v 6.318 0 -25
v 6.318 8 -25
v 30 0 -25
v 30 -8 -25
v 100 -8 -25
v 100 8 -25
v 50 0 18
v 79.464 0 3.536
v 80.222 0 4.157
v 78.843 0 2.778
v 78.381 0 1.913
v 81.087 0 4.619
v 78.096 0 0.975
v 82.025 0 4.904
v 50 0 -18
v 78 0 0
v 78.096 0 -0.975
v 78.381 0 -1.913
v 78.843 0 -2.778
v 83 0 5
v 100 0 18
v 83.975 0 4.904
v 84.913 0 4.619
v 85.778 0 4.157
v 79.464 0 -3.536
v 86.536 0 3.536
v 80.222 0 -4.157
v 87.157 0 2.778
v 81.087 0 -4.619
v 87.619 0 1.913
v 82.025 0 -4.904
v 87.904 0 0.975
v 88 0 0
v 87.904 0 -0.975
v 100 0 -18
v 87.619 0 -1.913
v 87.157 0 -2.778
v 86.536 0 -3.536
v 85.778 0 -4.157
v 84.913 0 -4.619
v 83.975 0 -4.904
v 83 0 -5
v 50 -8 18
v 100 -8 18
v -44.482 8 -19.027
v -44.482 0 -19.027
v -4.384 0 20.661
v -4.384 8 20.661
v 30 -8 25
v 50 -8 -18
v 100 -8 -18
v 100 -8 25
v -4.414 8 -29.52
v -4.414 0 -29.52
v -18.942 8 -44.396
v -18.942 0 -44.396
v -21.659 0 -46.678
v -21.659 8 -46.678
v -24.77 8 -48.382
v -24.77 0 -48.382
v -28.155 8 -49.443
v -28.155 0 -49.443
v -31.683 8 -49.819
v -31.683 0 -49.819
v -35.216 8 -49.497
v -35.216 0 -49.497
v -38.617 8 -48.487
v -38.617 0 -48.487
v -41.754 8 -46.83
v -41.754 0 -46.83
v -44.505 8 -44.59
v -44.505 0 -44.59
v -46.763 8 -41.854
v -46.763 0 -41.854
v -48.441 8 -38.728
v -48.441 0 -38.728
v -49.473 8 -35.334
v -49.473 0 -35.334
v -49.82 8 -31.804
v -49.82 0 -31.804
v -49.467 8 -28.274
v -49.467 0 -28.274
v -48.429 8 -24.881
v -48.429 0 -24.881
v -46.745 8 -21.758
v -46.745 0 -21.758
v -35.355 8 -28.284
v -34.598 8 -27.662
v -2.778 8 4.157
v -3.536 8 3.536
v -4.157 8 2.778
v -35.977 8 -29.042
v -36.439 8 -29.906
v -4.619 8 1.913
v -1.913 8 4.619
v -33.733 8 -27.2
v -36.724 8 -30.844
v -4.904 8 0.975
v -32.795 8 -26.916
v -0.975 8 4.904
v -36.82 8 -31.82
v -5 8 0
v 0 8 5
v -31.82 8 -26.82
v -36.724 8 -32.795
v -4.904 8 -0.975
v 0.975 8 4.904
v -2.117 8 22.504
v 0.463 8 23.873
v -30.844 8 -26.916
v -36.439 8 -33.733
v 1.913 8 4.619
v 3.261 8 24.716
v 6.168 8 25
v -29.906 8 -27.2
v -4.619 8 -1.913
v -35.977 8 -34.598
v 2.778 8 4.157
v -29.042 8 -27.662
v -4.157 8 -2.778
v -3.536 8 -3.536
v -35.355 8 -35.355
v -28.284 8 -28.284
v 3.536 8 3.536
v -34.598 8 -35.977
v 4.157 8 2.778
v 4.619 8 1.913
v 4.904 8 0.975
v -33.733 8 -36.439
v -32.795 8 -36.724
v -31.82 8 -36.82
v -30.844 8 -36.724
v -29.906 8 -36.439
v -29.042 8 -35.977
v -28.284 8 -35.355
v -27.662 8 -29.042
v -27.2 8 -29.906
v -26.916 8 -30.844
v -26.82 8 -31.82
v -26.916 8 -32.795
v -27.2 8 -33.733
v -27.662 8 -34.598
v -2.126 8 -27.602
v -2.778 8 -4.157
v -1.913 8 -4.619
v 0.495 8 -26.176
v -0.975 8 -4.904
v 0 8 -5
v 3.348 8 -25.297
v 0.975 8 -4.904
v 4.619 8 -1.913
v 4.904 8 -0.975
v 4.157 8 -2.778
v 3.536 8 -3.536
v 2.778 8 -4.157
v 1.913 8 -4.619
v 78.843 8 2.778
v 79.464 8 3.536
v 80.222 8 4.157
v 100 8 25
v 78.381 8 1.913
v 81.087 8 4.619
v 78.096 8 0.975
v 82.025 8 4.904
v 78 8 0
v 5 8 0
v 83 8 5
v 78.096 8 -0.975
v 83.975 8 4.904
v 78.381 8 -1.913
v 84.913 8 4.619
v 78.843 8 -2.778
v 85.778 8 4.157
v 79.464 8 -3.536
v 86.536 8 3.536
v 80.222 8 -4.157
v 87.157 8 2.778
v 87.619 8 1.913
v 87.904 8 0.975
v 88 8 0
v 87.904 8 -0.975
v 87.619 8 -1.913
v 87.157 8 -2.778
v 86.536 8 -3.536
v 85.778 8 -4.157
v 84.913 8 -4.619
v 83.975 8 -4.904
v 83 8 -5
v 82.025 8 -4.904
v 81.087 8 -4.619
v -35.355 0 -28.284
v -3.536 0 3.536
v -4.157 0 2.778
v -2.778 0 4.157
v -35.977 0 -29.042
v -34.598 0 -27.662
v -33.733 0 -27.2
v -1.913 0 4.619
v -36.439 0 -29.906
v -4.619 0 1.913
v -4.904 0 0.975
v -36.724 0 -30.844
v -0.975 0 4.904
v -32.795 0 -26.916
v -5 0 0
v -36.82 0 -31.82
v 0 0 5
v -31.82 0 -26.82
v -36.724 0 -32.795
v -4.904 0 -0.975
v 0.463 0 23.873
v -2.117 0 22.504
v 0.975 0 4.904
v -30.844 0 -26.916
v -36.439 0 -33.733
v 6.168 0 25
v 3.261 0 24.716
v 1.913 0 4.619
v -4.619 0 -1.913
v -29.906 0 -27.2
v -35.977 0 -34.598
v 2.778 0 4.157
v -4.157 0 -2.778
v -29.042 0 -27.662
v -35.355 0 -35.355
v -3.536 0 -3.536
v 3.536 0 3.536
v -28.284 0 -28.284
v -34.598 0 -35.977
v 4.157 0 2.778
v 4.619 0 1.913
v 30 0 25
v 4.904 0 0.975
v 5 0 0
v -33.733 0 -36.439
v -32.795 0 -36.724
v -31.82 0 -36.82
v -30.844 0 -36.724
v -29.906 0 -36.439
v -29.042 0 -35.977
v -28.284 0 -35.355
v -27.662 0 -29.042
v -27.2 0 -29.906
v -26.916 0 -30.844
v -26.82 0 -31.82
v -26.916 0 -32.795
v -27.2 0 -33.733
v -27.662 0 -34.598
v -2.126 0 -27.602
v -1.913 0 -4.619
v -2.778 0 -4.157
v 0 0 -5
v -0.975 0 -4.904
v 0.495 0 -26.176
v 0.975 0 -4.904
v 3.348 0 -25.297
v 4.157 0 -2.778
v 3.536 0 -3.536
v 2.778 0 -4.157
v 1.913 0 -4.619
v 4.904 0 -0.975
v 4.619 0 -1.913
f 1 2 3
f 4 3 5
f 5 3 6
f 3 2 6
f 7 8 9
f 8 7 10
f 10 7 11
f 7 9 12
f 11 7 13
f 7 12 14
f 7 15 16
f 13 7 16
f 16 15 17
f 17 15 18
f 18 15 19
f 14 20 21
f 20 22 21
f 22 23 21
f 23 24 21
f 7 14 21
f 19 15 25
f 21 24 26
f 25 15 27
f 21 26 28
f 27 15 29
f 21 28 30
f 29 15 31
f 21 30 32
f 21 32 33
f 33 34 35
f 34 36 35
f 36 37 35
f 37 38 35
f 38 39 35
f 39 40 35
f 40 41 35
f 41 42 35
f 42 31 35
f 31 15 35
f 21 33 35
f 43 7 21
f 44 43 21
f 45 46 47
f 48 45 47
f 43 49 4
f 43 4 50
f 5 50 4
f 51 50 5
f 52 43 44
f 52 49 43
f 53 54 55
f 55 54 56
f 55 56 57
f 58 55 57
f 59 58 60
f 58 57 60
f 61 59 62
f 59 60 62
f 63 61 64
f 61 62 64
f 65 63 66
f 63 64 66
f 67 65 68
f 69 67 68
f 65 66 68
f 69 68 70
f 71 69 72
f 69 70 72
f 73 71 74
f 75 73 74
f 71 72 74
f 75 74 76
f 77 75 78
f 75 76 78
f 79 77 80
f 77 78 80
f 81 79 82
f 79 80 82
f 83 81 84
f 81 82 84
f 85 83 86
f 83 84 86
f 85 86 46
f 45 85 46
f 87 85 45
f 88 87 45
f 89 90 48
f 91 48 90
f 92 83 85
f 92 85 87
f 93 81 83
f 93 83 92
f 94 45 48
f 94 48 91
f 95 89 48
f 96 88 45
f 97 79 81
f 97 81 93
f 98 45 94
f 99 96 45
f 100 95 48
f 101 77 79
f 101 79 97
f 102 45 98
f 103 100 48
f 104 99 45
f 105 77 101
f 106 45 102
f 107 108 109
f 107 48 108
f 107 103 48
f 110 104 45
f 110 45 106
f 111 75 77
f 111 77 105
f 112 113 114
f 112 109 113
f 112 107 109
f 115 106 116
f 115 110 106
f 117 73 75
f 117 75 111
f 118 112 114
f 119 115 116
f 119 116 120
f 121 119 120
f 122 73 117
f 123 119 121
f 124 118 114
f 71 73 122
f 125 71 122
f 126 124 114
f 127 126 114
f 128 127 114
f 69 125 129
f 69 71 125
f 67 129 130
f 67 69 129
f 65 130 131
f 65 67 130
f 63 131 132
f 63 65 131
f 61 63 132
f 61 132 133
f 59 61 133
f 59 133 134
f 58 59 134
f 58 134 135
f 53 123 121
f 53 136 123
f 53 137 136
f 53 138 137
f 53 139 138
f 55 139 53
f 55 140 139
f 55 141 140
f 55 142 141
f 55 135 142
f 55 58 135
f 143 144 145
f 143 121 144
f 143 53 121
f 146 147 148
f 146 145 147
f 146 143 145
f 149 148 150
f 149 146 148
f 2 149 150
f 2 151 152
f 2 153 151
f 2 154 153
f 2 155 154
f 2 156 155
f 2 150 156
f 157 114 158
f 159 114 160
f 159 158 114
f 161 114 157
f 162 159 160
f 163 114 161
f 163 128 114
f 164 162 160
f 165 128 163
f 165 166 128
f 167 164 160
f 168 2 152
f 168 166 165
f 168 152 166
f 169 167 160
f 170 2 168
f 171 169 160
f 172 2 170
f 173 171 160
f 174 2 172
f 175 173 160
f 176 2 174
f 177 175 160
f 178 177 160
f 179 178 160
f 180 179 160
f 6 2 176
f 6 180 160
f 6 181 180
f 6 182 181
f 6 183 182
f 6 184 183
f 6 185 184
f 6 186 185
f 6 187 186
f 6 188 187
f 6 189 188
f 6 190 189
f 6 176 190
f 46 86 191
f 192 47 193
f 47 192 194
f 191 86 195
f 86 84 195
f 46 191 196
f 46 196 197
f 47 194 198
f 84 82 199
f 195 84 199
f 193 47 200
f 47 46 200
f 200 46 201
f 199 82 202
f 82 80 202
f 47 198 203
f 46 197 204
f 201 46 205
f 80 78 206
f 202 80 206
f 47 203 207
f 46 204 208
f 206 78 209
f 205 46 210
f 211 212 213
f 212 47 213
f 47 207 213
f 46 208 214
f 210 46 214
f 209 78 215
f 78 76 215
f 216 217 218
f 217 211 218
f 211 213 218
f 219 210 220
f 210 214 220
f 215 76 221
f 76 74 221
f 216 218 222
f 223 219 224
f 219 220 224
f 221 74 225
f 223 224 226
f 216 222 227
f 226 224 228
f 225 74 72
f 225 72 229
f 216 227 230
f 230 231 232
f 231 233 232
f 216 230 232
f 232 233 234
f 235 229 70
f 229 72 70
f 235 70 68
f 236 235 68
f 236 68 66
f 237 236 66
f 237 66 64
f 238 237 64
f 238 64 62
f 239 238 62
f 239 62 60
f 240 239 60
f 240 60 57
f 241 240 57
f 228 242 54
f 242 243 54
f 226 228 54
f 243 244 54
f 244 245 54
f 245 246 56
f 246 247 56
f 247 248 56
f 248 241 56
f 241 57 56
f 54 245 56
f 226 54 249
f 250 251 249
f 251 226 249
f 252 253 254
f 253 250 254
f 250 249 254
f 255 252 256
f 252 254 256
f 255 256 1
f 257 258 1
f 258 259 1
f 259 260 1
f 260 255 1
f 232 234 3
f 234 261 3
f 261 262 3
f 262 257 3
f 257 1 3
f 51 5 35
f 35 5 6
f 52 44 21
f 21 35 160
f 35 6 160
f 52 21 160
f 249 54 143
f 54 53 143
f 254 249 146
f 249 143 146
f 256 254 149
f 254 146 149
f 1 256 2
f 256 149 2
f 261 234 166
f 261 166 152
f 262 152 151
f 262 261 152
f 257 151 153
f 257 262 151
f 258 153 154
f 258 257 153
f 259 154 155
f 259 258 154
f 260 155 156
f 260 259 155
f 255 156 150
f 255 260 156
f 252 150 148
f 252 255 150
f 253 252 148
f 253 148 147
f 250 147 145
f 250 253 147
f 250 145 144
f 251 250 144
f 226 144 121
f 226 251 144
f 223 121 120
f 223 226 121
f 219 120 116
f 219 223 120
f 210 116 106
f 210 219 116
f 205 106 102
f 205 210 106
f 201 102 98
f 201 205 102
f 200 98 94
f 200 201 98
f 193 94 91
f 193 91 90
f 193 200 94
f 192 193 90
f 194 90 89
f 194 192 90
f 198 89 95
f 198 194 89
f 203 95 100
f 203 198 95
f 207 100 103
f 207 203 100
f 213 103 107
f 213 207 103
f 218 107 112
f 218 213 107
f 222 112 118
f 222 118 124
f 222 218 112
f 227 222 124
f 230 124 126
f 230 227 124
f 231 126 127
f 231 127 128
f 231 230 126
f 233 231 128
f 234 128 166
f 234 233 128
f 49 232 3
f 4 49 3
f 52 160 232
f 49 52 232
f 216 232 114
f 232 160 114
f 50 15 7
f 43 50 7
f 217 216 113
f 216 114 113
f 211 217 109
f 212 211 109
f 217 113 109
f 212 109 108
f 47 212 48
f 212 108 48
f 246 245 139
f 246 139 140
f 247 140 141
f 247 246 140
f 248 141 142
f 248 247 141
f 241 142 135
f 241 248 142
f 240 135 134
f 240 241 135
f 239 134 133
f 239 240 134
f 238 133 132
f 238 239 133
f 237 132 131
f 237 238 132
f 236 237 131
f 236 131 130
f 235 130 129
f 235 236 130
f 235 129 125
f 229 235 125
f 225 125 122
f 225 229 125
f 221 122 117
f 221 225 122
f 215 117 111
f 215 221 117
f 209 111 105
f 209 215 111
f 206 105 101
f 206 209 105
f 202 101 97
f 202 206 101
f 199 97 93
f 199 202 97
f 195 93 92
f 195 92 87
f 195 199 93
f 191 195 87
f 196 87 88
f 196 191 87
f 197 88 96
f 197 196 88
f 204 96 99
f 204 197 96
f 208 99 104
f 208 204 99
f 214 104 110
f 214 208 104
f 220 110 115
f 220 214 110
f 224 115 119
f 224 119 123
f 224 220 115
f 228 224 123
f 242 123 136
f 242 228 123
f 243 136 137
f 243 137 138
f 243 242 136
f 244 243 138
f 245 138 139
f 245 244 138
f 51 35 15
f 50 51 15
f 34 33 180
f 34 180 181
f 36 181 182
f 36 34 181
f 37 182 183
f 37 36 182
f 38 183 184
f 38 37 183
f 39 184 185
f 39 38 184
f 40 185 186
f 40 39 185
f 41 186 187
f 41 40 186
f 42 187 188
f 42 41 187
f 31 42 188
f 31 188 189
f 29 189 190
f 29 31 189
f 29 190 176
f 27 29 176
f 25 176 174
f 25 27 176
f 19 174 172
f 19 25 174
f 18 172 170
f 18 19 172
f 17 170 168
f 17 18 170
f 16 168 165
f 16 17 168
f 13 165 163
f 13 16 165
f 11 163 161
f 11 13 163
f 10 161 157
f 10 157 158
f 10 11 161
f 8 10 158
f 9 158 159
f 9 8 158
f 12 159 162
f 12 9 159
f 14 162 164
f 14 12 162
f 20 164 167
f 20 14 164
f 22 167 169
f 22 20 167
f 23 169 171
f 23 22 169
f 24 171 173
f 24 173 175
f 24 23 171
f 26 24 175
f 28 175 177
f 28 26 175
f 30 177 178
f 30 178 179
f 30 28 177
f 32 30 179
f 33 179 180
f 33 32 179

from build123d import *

# Parameters (mm, degrees)
SKETCH1_R           = 5
BOSS_EXTRUDE1_DEPTH = 8
BOSS_EXTRUDE2_DEPTH = 8
FILLET1_R           = 15


with BuildPart() as part:
    # Sketch1 → Boss-Extrude1 (new body)
    with BuildSketch(Plane(origin=(0, 0, 0), x_dir=(1, 0, 0), z_dir=(0, 1, 0))):
        with BuildLine():
            Line((0, -25), (100, -25))
            Line((100, -25), (100, 25))
            Line((100, 25), (0, 25))
            Line((0, 25), (-18.942042706, 44.396101681))
            ThreePointArc((-18.942042706, 44.396101681), (-44.505039362, 44.590272375), (-44.48205564, 19.026548624))
            Line((-44.48205564, 19.026548624), (0, -25))
        make_face()
        with Locations((-31.819805153, 31.819805153)):
            Circle(SKETCH1_R, mode=Mode.SUBTRACT)
        Circle(SKETCH1_R, mode=Mode.SUBTRACT)
        with Locations((83, 0)):
            Circle(SKETCH1_R, mode=Mode.SUBTRACT)
    extrude(amount=BOSS_EXTRUDE1_DEPTH)

    # Sketch2 → Boss-Extrude2 (add)
    with BuildSketch(Plane.XZ):
        Polygon((100, 25), (30, 25), (30, -25), (100, -25), (100, -18), (50, -18), (50, 18), (100, 18), align=None)
    extrude(amount=BOSS_EXTRUDE2_DEPTH)

    # Fillet1
    fillet1_edges = [part.edges().sort_by_distance(p)[0] for p in [
        (0, 4, -25),
        (0, 4, 25),
    ]]
    fillet(fillet1_edges, radius=FILLET1_R)


solid = part.part
